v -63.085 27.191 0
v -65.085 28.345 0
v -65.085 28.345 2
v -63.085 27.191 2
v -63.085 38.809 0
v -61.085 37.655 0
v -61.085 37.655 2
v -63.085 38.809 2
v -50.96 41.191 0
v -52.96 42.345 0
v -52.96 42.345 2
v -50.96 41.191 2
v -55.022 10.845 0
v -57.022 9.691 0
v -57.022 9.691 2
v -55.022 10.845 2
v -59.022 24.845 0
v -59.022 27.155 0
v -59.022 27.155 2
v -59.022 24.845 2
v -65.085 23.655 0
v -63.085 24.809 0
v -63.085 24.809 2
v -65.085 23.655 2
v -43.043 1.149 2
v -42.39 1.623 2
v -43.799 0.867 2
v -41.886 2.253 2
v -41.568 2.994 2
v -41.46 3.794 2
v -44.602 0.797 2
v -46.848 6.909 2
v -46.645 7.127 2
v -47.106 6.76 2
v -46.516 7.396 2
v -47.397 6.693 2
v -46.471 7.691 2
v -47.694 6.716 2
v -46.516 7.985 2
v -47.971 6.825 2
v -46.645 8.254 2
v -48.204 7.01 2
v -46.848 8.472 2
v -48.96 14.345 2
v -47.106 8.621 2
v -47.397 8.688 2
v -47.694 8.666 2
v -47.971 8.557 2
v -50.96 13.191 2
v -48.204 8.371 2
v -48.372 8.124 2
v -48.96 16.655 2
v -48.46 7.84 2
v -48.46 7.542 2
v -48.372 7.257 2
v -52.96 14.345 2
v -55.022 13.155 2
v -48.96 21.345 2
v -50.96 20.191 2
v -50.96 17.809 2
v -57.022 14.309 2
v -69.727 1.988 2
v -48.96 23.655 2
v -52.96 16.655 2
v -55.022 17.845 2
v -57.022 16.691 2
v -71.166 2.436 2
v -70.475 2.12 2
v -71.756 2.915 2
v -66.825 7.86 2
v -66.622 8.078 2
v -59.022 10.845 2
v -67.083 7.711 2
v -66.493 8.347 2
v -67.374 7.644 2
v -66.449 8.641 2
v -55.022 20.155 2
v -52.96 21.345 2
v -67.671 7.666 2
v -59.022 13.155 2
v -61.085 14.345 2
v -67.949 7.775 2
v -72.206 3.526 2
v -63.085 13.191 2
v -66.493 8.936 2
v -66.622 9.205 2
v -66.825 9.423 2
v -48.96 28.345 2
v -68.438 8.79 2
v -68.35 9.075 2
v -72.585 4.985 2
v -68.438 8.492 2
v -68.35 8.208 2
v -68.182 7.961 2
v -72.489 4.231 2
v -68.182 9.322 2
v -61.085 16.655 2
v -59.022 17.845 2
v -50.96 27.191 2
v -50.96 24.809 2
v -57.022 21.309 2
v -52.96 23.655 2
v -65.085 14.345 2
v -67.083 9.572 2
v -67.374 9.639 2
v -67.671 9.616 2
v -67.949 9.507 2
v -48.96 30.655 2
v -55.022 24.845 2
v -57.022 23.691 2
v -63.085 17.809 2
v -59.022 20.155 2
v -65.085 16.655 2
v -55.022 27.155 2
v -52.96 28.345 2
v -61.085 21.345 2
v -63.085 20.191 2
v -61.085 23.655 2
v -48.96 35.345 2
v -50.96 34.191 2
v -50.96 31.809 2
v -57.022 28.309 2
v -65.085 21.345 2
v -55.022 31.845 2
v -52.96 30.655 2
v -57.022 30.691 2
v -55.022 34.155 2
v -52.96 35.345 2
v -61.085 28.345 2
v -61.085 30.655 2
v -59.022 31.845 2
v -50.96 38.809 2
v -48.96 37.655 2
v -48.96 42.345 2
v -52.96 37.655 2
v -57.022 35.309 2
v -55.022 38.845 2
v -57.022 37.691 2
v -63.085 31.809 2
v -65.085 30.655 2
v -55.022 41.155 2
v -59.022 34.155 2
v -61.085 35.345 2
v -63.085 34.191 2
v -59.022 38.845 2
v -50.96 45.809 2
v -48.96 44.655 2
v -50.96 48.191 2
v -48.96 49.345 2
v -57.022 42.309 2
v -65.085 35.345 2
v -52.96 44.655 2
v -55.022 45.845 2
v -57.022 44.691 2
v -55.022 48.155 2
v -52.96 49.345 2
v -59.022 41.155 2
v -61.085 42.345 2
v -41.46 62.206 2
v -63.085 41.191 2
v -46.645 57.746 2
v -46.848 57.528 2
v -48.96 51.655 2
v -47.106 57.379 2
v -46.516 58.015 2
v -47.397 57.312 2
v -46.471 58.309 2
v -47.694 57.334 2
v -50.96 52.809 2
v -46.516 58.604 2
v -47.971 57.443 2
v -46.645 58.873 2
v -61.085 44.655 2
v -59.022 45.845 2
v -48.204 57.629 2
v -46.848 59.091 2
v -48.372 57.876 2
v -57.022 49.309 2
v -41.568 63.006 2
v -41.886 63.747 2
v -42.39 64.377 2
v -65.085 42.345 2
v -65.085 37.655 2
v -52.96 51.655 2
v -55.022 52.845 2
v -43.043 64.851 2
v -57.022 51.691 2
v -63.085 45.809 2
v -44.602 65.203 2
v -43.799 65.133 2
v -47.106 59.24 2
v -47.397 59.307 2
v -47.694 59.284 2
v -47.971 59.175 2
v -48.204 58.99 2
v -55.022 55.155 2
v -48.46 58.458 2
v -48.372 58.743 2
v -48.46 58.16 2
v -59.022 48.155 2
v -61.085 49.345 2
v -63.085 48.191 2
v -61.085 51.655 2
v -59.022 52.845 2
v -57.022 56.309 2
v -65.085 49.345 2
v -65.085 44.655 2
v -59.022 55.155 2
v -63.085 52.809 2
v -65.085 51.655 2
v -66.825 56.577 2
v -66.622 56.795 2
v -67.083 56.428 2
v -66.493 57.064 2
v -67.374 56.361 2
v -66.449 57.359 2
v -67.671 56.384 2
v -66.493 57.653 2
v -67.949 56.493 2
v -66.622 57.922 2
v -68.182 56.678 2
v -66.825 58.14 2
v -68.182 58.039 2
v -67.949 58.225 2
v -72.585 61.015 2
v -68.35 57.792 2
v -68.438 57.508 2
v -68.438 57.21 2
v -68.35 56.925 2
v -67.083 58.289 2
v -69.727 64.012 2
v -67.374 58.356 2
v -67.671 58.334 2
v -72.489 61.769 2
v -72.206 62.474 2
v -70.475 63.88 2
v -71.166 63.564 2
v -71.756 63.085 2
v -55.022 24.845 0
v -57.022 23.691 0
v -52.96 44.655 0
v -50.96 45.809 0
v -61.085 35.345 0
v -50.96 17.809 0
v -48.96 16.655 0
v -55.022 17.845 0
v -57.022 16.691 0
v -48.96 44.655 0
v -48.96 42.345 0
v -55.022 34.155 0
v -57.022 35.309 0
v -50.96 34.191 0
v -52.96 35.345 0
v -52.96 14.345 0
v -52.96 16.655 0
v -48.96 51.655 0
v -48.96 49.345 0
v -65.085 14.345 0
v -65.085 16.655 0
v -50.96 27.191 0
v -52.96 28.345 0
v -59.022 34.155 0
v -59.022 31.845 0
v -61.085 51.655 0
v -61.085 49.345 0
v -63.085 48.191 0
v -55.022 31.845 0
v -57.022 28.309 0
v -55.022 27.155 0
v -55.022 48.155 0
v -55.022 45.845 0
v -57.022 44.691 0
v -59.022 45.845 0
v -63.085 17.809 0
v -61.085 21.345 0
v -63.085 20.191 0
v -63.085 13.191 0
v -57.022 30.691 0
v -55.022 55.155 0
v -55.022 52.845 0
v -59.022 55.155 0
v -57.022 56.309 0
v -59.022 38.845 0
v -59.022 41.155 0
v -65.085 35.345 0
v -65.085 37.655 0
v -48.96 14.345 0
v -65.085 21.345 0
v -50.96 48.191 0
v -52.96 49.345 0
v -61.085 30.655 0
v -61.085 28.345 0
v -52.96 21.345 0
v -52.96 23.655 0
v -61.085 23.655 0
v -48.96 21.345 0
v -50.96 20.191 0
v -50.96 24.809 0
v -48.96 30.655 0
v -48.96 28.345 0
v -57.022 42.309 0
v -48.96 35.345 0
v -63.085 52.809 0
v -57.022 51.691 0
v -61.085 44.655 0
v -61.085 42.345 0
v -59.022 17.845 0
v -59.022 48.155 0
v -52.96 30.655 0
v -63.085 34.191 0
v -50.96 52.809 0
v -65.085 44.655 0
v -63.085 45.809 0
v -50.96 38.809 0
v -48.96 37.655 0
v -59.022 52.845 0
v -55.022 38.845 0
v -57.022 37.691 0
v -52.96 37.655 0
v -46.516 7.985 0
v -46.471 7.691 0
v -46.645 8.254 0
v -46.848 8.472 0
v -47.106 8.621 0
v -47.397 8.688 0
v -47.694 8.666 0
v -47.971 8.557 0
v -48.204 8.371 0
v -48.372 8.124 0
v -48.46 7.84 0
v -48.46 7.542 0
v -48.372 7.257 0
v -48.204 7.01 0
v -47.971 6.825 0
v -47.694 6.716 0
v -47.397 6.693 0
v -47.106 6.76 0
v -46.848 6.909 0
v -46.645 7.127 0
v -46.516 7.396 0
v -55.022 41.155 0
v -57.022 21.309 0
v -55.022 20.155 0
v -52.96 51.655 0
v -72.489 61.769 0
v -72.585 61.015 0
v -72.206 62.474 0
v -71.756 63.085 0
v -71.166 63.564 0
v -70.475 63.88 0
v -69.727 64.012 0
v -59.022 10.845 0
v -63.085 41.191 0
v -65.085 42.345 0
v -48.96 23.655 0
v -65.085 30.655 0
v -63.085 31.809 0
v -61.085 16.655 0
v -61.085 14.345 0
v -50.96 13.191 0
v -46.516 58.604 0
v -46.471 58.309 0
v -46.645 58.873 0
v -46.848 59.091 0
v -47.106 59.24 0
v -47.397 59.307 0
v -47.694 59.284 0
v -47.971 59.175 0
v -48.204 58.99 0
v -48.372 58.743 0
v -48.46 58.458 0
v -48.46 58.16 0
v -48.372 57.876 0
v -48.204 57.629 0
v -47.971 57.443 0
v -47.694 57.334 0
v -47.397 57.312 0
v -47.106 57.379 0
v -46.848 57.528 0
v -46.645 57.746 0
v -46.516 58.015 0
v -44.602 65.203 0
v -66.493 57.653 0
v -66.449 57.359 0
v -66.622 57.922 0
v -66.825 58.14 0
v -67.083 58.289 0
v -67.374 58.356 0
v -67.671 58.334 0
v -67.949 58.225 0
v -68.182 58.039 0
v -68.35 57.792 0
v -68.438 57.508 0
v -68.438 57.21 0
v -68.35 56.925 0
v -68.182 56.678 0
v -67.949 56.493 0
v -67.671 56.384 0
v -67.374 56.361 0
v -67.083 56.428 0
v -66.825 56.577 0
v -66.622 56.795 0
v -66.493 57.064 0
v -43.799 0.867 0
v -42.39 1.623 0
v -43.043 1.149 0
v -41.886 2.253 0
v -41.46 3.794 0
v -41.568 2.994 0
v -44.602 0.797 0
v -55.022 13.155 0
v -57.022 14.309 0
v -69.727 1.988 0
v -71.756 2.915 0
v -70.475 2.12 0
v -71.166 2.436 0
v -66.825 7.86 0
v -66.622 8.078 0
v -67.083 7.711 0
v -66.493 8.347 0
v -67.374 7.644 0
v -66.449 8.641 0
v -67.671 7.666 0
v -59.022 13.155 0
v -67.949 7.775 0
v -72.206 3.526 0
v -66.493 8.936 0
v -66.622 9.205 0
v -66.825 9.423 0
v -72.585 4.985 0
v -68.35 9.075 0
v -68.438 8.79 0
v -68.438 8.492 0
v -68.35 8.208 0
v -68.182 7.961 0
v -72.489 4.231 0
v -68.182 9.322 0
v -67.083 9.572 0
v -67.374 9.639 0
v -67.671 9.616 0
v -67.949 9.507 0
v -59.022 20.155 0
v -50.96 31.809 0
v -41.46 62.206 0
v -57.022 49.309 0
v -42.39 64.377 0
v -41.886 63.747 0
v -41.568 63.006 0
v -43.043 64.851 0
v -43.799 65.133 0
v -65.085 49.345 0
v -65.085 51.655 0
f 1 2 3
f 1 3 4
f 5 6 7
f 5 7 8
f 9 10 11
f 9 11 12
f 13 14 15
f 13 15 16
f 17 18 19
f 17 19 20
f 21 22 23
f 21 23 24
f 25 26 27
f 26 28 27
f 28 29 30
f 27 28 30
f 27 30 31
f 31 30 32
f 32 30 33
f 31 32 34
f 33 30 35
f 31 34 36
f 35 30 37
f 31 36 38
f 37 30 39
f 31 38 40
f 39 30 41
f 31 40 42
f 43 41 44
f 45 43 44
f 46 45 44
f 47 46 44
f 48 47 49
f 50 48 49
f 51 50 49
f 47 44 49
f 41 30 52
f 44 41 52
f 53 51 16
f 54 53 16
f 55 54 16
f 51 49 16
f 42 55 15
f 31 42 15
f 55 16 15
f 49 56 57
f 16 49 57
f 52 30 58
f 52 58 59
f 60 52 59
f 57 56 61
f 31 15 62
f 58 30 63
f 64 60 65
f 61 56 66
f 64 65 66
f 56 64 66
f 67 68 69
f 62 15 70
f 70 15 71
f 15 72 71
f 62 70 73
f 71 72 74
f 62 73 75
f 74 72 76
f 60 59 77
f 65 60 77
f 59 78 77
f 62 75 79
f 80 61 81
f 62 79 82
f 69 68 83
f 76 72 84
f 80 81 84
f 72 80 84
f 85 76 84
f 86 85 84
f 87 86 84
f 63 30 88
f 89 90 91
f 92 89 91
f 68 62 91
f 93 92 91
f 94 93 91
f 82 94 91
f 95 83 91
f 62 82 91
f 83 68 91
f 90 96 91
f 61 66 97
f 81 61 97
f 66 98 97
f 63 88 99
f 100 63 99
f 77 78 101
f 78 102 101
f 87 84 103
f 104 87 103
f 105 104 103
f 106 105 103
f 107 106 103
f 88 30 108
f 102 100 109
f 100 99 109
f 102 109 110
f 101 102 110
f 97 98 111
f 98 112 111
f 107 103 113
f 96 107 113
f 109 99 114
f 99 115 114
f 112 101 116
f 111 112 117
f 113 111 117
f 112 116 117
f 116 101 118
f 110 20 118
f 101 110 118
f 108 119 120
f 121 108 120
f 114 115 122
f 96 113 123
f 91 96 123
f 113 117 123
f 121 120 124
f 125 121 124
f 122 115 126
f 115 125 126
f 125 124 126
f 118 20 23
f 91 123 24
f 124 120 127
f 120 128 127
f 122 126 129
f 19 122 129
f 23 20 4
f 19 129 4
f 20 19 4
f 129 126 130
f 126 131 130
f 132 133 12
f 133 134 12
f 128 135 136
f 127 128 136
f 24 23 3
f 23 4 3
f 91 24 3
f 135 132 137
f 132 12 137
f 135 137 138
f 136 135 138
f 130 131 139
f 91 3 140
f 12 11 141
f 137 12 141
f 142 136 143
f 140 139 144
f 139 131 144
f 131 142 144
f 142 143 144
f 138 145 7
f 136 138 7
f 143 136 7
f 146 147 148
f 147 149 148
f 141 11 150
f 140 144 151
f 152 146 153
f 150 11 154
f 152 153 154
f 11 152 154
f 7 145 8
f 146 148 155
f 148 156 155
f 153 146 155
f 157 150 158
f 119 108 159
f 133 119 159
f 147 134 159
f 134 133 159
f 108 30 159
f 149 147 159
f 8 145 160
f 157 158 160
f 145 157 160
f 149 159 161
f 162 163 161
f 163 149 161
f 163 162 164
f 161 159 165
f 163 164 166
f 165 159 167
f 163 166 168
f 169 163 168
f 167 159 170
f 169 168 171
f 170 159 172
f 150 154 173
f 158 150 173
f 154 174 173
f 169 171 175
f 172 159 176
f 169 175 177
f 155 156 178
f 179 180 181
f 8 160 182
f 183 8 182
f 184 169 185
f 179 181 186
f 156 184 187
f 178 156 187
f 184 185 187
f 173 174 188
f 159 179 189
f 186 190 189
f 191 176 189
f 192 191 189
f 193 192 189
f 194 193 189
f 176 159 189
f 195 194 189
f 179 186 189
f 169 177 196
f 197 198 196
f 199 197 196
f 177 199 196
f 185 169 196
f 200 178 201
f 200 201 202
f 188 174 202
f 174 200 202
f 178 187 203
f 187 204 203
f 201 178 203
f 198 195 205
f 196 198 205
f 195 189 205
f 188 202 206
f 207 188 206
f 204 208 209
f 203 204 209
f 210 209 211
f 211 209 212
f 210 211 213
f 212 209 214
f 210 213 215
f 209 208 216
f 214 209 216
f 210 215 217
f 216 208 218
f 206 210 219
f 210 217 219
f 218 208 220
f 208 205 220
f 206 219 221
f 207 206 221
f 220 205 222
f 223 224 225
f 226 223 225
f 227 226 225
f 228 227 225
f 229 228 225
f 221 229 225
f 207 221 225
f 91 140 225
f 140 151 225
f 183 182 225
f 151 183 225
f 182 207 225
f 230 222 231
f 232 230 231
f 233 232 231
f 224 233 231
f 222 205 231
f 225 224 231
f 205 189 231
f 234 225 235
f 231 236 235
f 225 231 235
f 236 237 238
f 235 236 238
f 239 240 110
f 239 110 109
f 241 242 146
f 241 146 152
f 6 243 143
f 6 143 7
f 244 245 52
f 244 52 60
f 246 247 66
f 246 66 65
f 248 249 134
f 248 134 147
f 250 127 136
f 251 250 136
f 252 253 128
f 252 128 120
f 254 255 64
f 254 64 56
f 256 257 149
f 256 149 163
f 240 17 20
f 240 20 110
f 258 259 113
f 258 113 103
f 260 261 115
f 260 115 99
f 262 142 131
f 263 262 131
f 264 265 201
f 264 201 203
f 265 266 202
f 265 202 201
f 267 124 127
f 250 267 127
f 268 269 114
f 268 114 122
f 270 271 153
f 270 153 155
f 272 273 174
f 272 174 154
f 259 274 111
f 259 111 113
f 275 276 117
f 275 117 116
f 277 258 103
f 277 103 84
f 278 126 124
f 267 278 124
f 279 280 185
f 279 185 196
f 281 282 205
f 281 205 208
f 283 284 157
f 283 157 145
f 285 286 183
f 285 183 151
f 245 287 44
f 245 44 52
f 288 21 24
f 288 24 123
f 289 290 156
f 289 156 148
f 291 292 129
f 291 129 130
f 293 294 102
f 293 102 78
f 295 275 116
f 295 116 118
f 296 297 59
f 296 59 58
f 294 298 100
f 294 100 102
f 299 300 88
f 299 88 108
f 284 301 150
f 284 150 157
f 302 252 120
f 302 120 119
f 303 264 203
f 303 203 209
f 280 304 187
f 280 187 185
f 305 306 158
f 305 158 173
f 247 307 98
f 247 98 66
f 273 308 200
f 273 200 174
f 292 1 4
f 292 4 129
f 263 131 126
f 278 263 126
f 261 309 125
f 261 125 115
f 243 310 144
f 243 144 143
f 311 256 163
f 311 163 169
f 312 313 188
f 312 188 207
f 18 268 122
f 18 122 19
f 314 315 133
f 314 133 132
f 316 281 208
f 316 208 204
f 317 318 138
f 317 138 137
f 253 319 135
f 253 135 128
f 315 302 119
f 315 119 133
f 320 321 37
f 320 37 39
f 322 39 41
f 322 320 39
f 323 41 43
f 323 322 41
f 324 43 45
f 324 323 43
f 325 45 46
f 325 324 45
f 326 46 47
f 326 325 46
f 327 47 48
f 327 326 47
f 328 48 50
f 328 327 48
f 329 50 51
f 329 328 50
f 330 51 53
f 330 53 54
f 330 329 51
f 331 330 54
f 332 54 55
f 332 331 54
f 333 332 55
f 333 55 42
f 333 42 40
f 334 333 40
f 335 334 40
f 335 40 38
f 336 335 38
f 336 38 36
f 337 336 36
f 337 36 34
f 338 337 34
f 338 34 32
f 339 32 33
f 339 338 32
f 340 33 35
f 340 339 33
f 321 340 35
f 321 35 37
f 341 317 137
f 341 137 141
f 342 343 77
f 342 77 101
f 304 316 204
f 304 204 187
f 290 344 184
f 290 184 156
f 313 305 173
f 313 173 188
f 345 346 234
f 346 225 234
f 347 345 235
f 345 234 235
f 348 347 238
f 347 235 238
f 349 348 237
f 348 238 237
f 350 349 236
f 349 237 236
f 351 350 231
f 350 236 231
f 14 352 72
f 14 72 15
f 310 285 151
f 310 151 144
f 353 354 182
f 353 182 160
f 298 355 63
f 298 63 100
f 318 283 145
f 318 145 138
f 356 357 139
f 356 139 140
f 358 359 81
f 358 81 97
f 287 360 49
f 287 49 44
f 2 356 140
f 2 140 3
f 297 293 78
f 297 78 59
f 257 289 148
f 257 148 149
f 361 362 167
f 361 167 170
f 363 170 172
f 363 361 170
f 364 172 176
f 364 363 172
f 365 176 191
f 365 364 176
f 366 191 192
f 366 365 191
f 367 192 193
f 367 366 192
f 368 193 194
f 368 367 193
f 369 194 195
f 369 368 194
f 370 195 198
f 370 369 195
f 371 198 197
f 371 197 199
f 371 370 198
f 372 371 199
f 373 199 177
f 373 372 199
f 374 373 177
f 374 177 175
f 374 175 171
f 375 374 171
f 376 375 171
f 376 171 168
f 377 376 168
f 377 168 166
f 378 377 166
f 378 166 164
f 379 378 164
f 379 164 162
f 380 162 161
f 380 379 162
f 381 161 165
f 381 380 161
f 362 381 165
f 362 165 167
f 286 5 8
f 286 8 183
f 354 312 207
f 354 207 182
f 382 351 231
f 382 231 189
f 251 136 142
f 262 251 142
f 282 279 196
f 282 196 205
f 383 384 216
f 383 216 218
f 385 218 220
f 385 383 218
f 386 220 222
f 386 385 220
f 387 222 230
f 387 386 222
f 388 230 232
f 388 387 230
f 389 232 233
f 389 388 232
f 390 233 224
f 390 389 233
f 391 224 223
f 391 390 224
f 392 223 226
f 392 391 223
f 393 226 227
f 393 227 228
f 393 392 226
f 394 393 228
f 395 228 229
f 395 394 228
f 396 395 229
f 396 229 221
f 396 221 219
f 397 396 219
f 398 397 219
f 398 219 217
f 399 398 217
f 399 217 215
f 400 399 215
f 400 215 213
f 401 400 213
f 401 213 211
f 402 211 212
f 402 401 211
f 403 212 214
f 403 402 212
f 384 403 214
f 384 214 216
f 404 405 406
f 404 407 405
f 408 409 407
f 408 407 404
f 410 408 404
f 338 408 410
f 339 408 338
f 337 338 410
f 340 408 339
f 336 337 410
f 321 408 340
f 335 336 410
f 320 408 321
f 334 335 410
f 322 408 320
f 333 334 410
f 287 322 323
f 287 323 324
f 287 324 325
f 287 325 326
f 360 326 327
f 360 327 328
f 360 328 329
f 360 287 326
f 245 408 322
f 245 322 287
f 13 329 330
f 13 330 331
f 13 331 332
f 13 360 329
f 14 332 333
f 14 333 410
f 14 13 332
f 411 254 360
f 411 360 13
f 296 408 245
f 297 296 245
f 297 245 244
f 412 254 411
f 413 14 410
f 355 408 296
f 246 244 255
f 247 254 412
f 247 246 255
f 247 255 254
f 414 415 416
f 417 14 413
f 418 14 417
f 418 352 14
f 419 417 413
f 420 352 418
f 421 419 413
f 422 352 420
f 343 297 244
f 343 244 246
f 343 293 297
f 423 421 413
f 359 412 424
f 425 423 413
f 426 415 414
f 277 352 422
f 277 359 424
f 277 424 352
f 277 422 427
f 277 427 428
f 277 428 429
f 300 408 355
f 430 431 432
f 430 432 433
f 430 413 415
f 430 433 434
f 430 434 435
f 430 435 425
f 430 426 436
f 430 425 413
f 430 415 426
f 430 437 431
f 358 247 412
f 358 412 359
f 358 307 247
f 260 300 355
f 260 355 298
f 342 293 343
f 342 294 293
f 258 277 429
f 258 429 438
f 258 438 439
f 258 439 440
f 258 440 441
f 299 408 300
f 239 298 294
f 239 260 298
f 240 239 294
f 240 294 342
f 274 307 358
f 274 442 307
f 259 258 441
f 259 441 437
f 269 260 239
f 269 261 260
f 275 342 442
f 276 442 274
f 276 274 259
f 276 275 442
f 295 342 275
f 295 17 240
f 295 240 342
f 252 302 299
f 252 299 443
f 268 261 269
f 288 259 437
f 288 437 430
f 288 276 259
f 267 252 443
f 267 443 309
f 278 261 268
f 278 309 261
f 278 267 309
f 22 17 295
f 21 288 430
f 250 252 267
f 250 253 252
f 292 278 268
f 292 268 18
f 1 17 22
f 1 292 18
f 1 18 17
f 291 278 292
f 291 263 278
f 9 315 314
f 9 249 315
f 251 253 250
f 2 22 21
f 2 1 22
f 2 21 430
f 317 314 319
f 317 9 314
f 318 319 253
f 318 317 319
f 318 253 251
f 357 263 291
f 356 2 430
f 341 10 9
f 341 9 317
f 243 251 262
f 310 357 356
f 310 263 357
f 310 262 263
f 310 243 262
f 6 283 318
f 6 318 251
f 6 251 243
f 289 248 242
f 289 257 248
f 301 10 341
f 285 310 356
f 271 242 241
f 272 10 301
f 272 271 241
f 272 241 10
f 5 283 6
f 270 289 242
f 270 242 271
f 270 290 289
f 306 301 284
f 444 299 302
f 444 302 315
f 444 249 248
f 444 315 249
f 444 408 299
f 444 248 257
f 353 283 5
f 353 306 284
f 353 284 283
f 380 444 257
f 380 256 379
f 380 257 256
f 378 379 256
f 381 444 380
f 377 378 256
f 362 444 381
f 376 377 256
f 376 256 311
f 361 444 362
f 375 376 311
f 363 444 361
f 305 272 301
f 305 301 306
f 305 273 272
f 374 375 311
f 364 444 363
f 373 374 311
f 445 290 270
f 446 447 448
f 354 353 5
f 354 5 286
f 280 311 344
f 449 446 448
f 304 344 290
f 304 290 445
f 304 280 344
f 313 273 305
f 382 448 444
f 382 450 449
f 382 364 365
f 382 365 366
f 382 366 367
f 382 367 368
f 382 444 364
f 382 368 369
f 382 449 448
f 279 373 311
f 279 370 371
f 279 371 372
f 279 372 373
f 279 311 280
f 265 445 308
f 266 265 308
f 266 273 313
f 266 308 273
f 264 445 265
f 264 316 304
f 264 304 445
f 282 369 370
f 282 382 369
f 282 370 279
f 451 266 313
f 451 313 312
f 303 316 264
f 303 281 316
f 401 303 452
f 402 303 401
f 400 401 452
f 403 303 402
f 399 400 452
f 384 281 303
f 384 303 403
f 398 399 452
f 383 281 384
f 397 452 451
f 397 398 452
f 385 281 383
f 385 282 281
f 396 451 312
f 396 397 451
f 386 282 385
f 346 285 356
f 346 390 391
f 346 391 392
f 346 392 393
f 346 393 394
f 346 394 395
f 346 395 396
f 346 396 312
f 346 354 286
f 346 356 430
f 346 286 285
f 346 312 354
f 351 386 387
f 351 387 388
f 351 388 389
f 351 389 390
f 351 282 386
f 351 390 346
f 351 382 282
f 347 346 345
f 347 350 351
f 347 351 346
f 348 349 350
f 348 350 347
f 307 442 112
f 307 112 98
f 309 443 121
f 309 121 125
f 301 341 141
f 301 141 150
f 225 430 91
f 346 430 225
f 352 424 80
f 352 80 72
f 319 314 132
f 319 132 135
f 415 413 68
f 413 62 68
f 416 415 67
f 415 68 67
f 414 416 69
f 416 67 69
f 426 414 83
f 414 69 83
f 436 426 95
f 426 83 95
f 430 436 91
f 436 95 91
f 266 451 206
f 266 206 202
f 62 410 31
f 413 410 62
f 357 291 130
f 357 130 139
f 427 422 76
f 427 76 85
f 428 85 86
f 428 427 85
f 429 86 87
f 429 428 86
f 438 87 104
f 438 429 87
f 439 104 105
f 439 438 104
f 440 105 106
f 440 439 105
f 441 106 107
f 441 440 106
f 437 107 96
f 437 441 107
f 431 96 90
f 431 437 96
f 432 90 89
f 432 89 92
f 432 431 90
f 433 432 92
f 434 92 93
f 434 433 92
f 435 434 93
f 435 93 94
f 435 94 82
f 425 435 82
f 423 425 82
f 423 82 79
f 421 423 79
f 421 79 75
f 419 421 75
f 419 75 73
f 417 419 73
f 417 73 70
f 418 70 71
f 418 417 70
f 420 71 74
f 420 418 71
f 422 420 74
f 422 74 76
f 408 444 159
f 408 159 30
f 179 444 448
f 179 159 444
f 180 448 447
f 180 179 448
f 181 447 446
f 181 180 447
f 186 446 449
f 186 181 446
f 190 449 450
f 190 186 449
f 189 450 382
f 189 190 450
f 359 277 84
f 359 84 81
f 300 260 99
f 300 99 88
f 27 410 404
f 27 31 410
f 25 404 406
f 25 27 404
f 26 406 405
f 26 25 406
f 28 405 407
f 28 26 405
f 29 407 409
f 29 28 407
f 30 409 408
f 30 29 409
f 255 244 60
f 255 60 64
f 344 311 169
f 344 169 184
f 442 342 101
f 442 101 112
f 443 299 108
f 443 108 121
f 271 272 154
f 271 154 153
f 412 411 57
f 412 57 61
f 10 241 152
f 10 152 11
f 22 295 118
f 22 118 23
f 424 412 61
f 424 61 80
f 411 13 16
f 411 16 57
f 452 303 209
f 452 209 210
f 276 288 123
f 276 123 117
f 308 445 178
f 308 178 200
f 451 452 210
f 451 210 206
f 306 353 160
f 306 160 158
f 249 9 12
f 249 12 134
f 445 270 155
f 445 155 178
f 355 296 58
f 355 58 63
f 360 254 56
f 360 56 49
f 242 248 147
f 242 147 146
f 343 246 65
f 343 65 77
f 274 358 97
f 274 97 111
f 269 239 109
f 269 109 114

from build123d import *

# Parameters (mm, degrees)
SKETCH_1_R          = 1
EXTRUDE_1_DEPTH     = 2
FILLET_1_R          = 3
CUT_EXTRUDE_1_DEPTH = 10
OTHER_1_DEPTH       = 2


# Read off the part's stored shape, not the designer's step: 填充阵列1
with BuildPart() as part:
    # 草图1 → 凸台-拉伸1 (new body)
    with BuildSketch(Plane.XY):
        Polygon((-41.460043107, 0.647951852), (-72.584789341, 2.123935292), (-72.584789341, 63.876064708), (-41.460043107, 65.352048148), align=None)
        with Locations((-67.448676919, 57.358573192)):
            Circle(SKETCH_1_R, mode=Mode.SUBTRACT)
        with Locations((-47.471291497, 58.309400037)):
            Circle(SKETCH_1_R, mode=Mode.SUBTRACT)
        with Locations((-67.448676919, 8.641426808)):
            Circle(SKETCH_1_R, mode=Mode.SUBTRACT)
        with Locations((-47.471291497, 7.690599963)):
            Circle(SKETCH_1_R, mode=Mode.SUBTRACT)
    extrude(amount=EXTRUDE_1_DEPTH)

    # 圆角1
    fillet_1_edges = [part.edges().sort_by_distance(p)[0] for p in [
        (-41.460043107, 0.647951852, 1),
        (-72.584789341, 2.123935292, 1),
        (-72.584789341, 63.876064708, 1),
        (-41.460043107, 65.352048148, 1),
    ]]
    fillet(fillet_1_edges, radius=FILLET_1_R)

    # 草图4 → 切除-拉伸1 (cut)
    with BuildSketch(Plane.XY.offset(2)):
        Polygon((-59.022416224, 33), (-55.022416224, 33), (-55.022416224, 34.154700538), (-57.022416224, 35.309401077), (-59.022416224, 34.154700538), align=None)
        Polygon((-55.022416224, 31.845299462), (-55.022416224, 33), (-59.022416224, 33), (-59.022416224, 31.845299462), (-57.022416224, 30.690598923), align=None)
    extrude(amount=-CUT_EXTRUDE_1_DEPTH, mode=Mode.SUBTRACT)

    # 填充阵列1 outline → 填充阵列1 (cut)
    with BuildSketch(Plane.XY):
        Polygon((-61.084594051, 30.654700538), (-63.084594051, 31.809401077), (-65.084594051, 30.654700538), (-65.084594051, 28.345299462), (-63.084594051, 27.190598923), (-61.084594051, 28.345299462), align=None)
        Polygon((-48.960238398, 37.654700538), (-50.960238398, 38.809401077), (-52.960238398, 37.654700538), (-52.960238398, 35.345299462), (-50.960238398, 34.190598923), (-48.960238398, 35.345299462), align=None)
        Polygon((-48.960238398, 28.345299462), (-48.960238398, 30.654700538), (-50.960238398, 31.809401077), (-52.960238398, 30.654700538), (-52.960238398, 28.345299462), (-50.960238398, 27.190598923), align=None)
        Polygon((-61.084594051, 35.345299462), (-61.084594051, 37.654700538), (-63.084594051, 38.809401077), (-65.084594051, 37.654700538), (-65.084594051, 35.345299462), (-63.084594051, 34.190598923), align=None)
        Polygon((-57.022416224, 51.690598923), (-55.022416224, 52.845299462), (-55.022416224, 55.154700538), (-57.022416224, 56.309401077), (-59.022416224, 55.154700538), (-59.022416224, 52.845299462), align=None)
        Polygon((-57.022416224, 9.690598923), (-55.022416224, 10.845299462), (-55.022416224, 13.154700538), (-57.022416224, 14.309401077), (-59.022416224, 13.154700538), (-59.022416224, 10.845299462), align=None)
        Polygon((-57.022416224, 23.690598923), (-55.022416224, 24.845299462), (-55.022416224, 27.154700538), (-57.022416224, 28.309401077), (-59.022416224, 27.154700538), (-59.022416224, 24.845299462), align=None)
        Polygon((-57.022416224, 16.690598923), (-55.022416224, 17.845299462), (-55.022416224, 20.154700538), (-57.022416224, 21.309401077), (-59.022416224, 20.154700538), (-59.022416224, 17.845299462), align=None)
        Polygon((-57.022416224, 44.690598923), (-55.022416224, 45.845299462), (-55.022416224, 48.154700538), (-57.022416224, 49.309401077), (-59.022416224, 48.154700538), (-59.022416224, 45.845299462), align=None)
        Polygon((-57.022416224, 37.690598923), (-55.022416224, 38.845299462), (-55.022416224, 41.154700538), (-57.022416224, 42.309401077), (-59.022416224, 41.154700538), (-59.022416224, 38.845299462), align=None)
        Polygon((-61.084594051, 51.654700538), (-63.084594051, 52.809401077), (-65.084594051, 51.654700538), (-65.084594051, 49.345299462), (-63.084594051, 48.190598923), (-61.084594051, 49.345299462), align=None)
        Polygon((-48.960238398, 49.345299462), (-48.960238398, 51.654700538), (-50.960238398, 52.809401077), (-52.960238398, 51.654700538), (-52.960238398, 49.345299462), (-50.960238398, 48.190598923), align=None)
        Polygon((-48.960238398, 16.654700538), (-50.960238398, 17.809401077), (-52.960238398, 16.654700538), (-52.960238398, 14.345299462), (-50.960238398, 13.190598923), (-48.960238398, 14.345299462), align=None)
        Polygon((-61.084594051, 14.345299462), (-61.084594051, 16.654700538), (-63.084594051, 17.809401077), (-65.084594051, 16.654700538), (-65.084594051, 14.345299462), (-63.084594051, 13.190598923), align=None)
        Polygon((-48.960238398, 23.654700538), (-50.960238398, 24.809401077), (-52.960238398, 23.654700538), (-52.960238398, 21.345299462), (-50.960238398, 20.190598923), (-48.960238398, 21.345299462), align=None)
        Polygon((-50.960238398, 41.190598923), (-48.960238398, 42.345299462), (-48.960238398, 44.654700538), (-50.960238398, 45.809401077), (-52.960238398, 44.654700538), (-52.960238398, 42.345299462), align=None)
        Polygon((-61.084594051, 23.654700538), (-63.084594051, 24.809401077), (-65.084594051, 23.654700538), (-65.084594051, 21.345299462), (-63.084594051, 20.190598923), (-61.084594051, 21.345299462), align=None)
        Polygon((-63.084594051, 41.190598923), (-61.084594051, 42.345299462), (-61.084594051, 44.654700538), (-63.084594051, 45.809401077), (-65.084594051, 44.654700538), (-65.084594051, 42.345299462), align=None)
    extrude(amount=OTHER_1_DEPTH, mode=Mode.SUBTRACT)


solid = part.part
